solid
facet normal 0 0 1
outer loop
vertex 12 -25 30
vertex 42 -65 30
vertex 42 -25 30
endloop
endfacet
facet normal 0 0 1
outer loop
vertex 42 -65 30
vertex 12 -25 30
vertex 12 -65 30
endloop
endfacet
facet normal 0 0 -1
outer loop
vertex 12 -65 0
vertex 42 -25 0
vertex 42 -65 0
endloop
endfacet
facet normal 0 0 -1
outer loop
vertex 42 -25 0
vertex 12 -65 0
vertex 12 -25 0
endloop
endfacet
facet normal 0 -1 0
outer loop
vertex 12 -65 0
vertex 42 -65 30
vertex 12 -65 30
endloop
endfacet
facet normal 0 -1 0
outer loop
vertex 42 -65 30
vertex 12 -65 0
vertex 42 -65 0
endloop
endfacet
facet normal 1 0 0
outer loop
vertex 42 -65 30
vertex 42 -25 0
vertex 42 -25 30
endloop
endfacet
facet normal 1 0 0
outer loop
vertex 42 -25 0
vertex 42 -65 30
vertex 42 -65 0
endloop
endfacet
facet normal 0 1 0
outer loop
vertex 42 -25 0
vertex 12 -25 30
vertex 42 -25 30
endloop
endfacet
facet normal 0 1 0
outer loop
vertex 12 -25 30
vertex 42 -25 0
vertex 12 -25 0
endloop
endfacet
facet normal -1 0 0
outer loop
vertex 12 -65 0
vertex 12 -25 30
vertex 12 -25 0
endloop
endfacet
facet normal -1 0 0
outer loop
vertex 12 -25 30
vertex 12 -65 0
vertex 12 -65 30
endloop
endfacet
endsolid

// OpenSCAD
intersection() {
    translate([12,-65,0]) {
        cube([30,40,30]);
    };
}
